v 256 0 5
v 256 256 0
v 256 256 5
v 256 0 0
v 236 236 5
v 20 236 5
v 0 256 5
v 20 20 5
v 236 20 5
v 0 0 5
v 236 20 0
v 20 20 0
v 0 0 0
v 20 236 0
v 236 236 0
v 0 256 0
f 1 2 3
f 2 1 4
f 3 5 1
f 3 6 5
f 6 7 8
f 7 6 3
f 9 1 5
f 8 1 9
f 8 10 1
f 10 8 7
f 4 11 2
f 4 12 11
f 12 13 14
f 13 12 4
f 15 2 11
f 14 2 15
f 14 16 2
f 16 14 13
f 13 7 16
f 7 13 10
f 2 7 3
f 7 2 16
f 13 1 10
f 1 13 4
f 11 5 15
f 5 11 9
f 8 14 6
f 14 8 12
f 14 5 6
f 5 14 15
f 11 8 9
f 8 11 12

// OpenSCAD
is = 216;
t = 20;
h = 5;

difference() {
  cube([is+t*2,is+t*2,h]);
  translate([t,t,-0.5]) cube([is,is,h+1]);

}
